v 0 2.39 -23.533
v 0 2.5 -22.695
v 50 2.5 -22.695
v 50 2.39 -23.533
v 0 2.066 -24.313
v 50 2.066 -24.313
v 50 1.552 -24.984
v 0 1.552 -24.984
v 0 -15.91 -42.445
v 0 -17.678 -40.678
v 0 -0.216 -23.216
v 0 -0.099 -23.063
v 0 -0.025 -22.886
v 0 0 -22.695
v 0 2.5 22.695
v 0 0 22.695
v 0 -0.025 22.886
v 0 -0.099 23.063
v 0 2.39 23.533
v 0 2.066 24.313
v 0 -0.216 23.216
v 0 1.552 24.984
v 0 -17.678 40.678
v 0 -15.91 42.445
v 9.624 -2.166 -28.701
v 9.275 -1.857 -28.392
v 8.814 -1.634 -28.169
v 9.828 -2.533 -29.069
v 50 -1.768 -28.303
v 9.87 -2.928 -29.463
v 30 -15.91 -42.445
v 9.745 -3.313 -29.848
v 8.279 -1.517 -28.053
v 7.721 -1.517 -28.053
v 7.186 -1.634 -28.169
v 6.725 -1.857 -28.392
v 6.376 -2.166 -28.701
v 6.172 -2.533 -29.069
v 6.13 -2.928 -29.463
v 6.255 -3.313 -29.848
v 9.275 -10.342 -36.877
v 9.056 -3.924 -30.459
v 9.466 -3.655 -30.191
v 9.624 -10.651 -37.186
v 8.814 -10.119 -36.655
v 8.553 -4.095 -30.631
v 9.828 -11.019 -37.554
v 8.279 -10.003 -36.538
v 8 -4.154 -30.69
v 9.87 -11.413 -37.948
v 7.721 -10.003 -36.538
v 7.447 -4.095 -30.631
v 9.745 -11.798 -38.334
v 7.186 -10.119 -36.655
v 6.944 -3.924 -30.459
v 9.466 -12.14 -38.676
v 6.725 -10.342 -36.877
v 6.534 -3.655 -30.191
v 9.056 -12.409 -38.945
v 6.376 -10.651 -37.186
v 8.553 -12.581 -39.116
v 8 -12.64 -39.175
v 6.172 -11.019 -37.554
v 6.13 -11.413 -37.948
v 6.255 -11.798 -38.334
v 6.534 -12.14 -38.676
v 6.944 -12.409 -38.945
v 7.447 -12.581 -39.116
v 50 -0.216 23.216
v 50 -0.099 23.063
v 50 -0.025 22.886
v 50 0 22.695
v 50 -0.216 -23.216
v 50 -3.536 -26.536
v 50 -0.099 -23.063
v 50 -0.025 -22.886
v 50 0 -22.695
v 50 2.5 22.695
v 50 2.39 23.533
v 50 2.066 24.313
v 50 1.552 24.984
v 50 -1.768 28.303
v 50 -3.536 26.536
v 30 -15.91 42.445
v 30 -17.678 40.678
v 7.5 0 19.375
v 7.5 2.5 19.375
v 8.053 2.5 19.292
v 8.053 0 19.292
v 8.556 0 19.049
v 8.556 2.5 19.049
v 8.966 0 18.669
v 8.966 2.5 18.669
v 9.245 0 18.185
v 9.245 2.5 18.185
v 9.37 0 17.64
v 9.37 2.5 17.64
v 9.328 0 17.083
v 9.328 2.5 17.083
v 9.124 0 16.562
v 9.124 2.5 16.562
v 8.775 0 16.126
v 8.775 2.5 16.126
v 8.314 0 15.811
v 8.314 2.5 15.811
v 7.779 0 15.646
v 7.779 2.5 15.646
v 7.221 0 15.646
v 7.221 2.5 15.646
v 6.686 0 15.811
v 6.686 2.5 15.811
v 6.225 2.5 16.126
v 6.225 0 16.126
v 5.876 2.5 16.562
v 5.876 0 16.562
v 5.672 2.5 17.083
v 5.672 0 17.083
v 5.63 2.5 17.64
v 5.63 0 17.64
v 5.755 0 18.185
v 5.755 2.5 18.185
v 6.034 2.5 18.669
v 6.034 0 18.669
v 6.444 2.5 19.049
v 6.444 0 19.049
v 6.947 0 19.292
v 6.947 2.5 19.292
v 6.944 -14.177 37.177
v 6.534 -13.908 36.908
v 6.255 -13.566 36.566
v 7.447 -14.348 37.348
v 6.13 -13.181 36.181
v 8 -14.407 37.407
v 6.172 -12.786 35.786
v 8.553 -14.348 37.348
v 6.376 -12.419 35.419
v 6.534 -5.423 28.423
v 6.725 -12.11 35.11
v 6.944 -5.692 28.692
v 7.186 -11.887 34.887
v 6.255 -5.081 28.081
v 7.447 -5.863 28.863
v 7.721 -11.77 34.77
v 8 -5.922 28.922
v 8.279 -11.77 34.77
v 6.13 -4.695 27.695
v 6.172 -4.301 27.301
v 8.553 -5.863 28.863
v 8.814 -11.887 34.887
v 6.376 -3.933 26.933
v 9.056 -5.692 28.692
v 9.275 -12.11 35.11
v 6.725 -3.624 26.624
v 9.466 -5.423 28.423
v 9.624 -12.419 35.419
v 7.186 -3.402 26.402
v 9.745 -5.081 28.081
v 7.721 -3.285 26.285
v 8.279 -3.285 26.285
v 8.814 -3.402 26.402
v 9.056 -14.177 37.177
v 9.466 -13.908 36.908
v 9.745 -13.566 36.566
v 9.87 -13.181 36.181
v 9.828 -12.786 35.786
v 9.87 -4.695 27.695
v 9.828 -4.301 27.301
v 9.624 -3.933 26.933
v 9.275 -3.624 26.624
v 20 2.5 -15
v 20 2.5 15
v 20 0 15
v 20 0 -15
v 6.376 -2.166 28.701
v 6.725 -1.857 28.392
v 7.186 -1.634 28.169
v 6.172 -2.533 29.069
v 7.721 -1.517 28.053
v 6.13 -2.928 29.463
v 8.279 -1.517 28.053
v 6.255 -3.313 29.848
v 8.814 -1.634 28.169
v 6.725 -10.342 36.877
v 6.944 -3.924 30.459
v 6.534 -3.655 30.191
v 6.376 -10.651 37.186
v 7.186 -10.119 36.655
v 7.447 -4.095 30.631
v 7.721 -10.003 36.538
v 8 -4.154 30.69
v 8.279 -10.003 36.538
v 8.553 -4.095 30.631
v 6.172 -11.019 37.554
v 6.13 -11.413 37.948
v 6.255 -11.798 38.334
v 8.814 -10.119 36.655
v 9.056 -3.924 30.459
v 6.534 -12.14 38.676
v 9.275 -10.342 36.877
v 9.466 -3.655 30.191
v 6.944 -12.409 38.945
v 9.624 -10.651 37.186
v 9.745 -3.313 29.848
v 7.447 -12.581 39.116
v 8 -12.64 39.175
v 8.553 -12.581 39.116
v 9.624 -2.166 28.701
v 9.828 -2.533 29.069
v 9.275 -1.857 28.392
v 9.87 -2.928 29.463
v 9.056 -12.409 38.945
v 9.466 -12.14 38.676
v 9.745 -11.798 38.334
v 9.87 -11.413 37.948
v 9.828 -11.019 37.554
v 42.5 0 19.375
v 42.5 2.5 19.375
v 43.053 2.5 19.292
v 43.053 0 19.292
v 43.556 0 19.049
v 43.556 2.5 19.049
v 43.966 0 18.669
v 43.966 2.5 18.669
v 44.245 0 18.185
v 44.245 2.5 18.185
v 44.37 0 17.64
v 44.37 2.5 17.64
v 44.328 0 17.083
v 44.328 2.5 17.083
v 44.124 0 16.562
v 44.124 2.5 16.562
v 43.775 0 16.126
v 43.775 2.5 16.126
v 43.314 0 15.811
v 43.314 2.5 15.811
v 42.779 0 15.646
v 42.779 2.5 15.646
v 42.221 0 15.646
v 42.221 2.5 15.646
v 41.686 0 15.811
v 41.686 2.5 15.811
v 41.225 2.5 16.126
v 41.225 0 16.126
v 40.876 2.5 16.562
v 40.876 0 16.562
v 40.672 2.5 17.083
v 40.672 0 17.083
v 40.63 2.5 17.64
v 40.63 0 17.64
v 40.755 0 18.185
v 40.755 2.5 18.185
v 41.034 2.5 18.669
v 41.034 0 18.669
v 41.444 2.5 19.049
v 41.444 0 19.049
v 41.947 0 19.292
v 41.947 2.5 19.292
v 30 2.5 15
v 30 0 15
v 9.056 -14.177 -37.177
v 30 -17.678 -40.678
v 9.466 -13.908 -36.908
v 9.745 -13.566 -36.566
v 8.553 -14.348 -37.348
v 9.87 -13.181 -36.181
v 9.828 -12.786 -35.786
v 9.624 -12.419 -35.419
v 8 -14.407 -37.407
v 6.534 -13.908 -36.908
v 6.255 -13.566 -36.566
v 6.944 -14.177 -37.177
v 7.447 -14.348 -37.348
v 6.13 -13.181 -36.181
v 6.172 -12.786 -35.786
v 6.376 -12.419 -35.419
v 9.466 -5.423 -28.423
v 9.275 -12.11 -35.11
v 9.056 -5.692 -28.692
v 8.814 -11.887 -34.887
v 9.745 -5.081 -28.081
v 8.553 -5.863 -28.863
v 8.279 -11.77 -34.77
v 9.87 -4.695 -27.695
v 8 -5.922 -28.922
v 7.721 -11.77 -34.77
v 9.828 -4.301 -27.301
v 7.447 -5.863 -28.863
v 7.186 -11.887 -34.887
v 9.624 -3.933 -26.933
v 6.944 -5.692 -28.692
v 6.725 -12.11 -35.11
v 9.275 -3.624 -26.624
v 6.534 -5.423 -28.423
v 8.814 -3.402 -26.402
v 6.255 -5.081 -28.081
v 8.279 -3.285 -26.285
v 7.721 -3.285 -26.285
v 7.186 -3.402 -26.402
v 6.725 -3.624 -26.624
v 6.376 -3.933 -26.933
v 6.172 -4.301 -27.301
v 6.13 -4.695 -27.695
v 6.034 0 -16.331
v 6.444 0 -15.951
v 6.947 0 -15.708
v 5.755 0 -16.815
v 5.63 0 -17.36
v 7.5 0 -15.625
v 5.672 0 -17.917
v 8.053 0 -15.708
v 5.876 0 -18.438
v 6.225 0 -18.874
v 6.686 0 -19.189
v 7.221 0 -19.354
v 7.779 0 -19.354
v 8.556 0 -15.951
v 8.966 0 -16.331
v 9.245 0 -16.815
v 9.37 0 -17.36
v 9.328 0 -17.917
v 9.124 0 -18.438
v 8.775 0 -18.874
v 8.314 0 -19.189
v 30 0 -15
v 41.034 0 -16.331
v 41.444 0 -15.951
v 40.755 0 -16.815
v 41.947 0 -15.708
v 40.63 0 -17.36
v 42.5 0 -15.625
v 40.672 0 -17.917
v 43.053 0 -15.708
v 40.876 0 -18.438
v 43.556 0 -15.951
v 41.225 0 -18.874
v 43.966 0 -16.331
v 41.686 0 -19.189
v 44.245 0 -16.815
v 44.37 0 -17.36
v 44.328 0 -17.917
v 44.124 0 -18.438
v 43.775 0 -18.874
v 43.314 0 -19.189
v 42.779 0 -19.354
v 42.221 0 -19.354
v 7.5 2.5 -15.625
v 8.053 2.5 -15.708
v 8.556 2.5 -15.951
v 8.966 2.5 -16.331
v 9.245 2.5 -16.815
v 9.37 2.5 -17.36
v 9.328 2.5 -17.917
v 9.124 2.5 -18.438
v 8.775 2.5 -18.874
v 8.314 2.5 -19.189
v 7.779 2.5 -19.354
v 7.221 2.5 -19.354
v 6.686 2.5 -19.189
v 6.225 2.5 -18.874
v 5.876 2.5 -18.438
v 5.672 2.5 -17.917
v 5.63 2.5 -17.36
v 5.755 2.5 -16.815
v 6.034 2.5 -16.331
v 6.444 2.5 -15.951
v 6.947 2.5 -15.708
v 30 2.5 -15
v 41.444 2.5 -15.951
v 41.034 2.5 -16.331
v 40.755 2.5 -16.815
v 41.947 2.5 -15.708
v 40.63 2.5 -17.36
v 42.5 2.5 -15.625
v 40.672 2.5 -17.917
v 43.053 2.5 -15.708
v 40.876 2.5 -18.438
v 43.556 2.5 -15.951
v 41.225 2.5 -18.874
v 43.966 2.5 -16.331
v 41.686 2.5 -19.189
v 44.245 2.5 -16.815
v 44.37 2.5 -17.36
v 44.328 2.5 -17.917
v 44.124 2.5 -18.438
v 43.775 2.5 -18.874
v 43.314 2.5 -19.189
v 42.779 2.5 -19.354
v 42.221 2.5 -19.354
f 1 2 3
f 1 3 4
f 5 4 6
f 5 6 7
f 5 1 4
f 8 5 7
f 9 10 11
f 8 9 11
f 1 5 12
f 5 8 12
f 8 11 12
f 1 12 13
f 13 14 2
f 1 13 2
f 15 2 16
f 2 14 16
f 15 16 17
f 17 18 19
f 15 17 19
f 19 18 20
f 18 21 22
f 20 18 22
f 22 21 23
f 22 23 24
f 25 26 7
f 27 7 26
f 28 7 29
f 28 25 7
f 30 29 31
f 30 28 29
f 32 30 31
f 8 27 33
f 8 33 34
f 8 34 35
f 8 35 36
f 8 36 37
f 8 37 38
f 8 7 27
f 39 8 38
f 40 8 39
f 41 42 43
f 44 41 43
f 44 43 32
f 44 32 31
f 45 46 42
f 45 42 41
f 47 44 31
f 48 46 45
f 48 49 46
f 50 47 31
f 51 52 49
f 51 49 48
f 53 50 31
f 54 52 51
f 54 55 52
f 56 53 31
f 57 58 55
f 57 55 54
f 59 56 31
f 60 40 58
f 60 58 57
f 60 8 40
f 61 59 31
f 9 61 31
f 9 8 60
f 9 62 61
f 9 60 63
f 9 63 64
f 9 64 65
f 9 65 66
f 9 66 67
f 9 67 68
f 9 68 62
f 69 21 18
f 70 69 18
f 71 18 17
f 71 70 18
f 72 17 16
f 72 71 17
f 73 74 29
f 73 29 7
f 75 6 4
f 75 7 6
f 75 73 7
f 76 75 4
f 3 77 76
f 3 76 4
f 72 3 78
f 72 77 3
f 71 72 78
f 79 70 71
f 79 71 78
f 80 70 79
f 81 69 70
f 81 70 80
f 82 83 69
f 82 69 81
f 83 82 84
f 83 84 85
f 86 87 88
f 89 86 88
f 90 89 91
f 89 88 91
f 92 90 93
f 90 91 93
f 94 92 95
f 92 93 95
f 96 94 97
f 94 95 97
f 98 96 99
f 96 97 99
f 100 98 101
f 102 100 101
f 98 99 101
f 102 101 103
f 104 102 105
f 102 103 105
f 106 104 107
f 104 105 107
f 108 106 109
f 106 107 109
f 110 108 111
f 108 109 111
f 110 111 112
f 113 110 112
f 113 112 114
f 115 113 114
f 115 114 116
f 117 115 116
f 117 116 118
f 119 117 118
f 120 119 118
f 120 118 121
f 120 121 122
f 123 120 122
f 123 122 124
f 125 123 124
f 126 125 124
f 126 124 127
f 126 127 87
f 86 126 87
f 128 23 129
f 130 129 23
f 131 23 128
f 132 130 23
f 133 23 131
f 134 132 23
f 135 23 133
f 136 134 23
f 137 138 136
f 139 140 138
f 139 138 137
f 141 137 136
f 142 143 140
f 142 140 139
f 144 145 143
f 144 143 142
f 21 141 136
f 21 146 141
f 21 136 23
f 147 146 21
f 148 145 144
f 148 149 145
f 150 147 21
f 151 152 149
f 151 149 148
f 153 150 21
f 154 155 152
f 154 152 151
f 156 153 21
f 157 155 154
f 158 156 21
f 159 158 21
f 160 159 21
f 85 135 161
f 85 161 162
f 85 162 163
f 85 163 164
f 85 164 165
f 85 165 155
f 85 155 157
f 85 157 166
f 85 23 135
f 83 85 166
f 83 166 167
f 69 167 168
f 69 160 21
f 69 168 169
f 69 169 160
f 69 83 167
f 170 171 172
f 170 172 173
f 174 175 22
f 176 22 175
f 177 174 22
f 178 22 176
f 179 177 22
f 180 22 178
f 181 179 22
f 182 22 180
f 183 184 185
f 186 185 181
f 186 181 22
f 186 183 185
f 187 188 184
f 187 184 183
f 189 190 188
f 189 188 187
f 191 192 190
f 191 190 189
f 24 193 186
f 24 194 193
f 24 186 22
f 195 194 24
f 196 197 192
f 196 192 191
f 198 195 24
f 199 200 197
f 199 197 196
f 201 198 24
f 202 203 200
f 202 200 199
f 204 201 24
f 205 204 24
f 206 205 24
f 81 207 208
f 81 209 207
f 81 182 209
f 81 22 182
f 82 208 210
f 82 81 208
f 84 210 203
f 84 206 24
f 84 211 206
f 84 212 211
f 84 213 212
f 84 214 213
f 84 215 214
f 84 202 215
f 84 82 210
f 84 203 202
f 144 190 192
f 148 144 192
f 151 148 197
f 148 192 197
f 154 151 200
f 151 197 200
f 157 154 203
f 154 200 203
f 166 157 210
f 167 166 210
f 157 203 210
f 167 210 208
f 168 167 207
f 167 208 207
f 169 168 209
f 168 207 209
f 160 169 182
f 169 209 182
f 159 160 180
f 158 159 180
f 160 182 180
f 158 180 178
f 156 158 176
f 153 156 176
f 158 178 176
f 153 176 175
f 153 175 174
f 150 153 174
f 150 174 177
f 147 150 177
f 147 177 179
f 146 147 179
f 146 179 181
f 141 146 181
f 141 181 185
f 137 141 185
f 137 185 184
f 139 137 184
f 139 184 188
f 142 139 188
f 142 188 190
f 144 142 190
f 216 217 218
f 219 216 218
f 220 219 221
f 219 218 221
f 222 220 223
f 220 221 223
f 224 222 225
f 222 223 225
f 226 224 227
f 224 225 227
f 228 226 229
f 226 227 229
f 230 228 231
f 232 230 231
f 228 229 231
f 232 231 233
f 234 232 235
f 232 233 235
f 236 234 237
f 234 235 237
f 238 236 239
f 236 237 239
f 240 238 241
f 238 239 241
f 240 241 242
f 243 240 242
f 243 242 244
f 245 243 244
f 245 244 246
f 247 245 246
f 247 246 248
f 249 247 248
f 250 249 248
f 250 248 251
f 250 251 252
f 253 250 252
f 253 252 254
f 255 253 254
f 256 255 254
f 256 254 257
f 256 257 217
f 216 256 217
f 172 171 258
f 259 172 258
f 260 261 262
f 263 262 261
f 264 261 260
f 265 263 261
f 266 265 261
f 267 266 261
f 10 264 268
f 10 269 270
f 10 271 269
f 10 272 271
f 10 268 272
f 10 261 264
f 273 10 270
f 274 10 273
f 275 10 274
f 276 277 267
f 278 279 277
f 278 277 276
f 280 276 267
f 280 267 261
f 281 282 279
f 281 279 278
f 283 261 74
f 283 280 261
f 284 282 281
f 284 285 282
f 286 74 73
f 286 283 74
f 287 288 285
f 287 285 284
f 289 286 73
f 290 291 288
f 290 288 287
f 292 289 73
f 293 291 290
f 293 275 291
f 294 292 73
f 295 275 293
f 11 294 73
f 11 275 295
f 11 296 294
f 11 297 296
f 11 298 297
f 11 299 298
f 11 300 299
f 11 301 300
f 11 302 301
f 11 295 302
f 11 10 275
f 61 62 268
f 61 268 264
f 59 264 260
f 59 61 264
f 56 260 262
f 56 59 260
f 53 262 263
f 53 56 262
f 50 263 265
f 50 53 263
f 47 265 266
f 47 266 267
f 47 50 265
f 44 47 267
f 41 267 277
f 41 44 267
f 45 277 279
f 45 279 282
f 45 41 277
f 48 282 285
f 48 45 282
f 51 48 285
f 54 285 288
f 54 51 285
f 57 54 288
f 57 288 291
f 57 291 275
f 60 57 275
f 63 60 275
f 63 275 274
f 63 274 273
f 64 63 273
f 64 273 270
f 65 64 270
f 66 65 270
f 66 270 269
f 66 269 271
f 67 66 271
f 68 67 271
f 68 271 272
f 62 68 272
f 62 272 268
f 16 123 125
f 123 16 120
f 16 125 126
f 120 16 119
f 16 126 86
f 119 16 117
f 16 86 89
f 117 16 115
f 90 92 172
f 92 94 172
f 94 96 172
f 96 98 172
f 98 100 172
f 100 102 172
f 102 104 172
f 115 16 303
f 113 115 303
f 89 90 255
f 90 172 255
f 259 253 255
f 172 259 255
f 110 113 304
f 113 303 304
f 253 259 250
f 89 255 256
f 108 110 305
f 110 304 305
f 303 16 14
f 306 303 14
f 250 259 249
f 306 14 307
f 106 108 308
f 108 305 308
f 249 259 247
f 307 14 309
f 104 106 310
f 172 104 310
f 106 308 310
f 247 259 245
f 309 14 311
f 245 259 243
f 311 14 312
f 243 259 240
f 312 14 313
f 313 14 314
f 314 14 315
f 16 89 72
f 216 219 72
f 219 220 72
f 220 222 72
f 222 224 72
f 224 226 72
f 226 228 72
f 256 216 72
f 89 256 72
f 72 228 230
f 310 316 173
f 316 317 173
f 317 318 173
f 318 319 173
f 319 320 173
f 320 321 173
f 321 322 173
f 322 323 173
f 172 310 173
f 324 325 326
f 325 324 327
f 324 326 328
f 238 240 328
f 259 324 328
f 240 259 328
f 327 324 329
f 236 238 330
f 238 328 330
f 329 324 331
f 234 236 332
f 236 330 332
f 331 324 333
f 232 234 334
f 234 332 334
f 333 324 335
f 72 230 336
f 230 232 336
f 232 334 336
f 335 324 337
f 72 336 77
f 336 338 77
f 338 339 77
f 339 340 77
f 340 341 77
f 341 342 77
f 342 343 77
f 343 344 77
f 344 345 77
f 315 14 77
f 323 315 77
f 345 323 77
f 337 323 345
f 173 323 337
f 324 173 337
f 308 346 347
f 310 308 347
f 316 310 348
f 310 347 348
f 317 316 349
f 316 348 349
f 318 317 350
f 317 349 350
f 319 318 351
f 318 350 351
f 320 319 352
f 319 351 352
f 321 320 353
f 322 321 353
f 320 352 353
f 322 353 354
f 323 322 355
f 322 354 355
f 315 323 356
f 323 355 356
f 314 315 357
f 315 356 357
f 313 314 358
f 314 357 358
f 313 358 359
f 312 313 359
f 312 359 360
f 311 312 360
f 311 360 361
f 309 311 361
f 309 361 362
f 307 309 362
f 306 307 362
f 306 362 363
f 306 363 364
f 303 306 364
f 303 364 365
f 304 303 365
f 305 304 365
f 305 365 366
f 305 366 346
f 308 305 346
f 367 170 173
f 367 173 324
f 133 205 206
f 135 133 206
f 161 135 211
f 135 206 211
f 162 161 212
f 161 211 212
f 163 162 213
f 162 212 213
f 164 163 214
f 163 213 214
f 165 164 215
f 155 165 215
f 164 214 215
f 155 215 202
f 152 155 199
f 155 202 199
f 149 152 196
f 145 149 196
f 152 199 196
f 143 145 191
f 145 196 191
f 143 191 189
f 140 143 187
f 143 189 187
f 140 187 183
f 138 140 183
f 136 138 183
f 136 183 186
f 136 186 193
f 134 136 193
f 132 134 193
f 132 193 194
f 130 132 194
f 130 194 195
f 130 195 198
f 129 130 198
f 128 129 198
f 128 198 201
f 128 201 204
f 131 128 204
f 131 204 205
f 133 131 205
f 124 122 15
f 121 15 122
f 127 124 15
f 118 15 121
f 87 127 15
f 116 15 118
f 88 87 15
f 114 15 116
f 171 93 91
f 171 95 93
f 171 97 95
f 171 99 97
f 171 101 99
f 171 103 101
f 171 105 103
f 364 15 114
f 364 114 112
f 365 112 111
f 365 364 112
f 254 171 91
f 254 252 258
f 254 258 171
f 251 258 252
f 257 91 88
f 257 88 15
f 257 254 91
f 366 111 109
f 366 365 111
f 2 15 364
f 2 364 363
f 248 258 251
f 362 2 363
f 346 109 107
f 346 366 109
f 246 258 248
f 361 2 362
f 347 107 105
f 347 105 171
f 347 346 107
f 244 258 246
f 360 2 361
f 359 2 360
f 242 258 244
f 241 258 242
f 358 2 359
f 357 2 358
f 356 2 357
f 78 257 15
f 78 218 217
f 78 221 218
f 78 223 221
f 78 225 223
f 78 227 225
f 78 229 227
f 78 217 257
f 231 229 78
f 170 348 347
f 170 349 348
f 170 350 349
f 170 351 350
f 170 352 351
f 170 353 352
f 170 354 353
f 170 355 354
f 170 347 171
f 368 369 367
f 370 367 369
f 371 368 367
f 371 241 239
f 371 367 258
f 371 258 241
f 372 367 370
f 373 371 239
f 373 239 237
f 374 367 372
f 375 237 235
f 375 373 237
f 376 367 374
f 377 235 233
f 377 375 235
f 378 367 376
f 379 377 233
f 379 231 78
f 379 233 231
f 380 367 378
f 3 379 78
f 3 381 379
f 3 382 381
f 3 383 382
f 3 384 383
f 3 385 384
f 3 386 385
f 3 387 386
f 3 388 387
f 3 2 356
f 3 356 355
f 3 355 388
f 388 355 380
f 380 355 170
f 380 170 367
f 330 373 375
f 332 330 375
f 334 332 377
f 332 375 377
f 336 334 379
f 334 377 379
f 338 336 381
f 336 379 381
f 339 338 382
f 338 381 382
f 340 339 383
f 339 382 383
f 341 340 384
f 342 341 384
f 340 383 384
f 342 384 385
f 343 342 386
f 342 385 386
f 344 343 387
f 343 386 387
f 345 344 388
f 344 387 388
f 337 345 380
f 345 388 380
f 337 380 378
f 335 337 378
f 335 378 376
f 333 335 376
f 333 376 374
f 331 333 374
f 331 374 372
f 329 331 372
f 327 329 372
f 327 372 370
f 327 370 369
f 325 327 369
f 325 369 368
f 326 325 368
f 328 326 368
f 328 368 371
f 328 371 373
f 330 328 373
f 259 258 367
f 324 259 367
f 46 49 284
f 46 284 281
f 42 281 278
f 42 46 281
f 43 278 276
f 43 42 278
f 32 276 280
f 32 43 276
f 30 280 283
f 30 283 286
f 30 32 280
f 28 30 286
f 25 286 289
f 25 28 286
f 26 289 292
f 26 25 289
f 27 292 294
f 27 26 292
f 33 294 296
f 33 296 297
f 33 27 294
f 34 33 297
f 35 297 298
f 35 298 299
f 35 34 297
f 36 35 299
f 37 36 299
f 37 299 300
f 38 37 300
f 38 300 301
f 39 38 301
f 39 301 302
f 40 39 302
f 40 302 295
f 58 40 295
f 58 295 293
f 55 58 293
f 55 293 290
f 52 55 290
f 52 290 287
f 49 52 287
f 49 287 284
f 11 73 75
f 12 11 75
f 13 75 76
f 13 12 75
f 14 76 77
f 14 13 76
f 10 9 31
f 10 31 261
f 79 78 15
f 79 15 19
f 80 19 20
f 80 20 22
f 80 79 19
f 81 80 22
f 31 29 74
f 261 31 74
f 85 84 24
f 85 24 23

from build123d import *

# Parameters (mm, degrees)
SKETCH1_W                      = 50
SKETCH1_H                      = 46
BASE_FLANGE1_DEPTH             = 2.5
EDGE_FLANGE1_STRIP_CUT_DEPTH   = 50
EDGE_FLANGE1_STRIP_CUT_2_DEPTH = 50
EDGE_FLANGE1_DEPTH             = 50
EDGE_FLANGE1_BEND_DEPTH        = 50
CUT_EXTRUDE1_REACH             = 83.004
SKETCH13_R                     = 1.875
CUT_EXTRUDE2_REACH             = 70.62
SKETCH14_R                     = 1.875
CHAMFER1_SIZE                  = 20
CUT_EXTRUDE3_REACH             = 70.62
SKETCH15_W                     = 10
SKETCH15_H                     = 30


# Sheet-metal steps are written as plain solids
with BuildPart() as part:
    # Sketch1 → Base-Flange1 (new body)
    with BuildSketch(Plane(origin=(0, 0, 0), x_dir=(1, 0, 0), z_dir=(0, 1, 0))):
        with Locations((25, 0)):
            Rectangle(SKETCH1_W, SKETCH1_H)
    extrude(amount=BASE_FLANGE1_DEPTH)

    # Edge-Flange1 strip (across the edge) → Edge-Flange1 strip cut (cut)
    with BuildSketch(Plane(origin=(0, 0, -23), x_dir=(0, -0.7071067811865512, 0.7071067811865438), z_dir=(1, 0, 0))):
        Polygon((-9.66479933, 6.129265424), (-1.552021808, -1.983512098), (0.215745145, -0.215745145), (-7.897032377, 7.897032377), align=None)
    extrude(amount=EDGE_FLANGE1_STRIP_CUT_DEPTH, mode=Mode.SUBTRACT)

    # Edge-Flange1 strip 2 (across the edge) → Edge-Flange1 strip cut 2 (cut)
    with BuildSketch(Plane(origin=(50, 0, 23), x_dir=(0, -0.7071067811865512, -0.7071067811865438), z_dir=(-1, 0, 0))):
        Polygon((-9.66479933, 6.129265424), (-1.552021808, -1.983512098), (0.215745145, -0.215745145), (-7.897032377, 7.897032377), align=None)
    extrude(amount=EDGE_FLANGE1_STRIP_CUT_2_DEPTH, mode=Mode.SUBTRACT)

    # Edge-Flange1 section (across the edge) → Edge-Flange1 (add)
    with BuildSketch(Plane(origin=(0, 0, -23), x_dir=(0, -0.7071067811865512, 0.7071067811865438), z_dir=(1, 0, 0))):
        with BuildLine():
            Line((-2.5, 0.30510971), (-2.5, 25))
            Line((-2.5, 25), (0, 25))
            Line((0, 25), (0, 0.30510971))
            ThreePointArc((0, 0.30510971), (0.056070336, 0.023225094), (0.215745145, -0.215745145))
            Line((0.215745145, -0.215745145), (-1.552021808, -1.983512098))
            ThreePointArc((-1.552021808, -1.983512098), (-2.253628495, -0.933483487), (-2.5, 0.30510971))
        make_face()
    extrude(amount=EDGE_FLANGE1_DEPTH)

    # Edge-Flange1 section 2 (across the edge) → Edge-Flange1 bend (add)
    with BuildSketch(Plane(origin=(50, 0, 23), x_dir=(0, -0.7071067811865512, -0.7071067811865438), z_dir=(-1, 0, 0))):
        with BuildLine():
            Line((-2.5, 0.30510971), (-2.5, 25))
            Line((-2.5, 25), (0, 25))
            Line((0, 25), (0, 0.30510971))
            ThreePointArc((0, 0.30510971), (0.056070336, 0.023225094), (0.215745145, -0.215745145))
            Line((0.215745145, -0.215745145), (-1.552021808, -1.983512098))
            ThreePointArc((-1.552021808, -1.983512098), (-2.253628495, -0.933483487), (-2.5, 0.30510971))
        make_face()
    extrude(amount=EDGE_FLANGE1_BEND_DEPTH)

    # Sketch13 → Cut-Extrude1 (cut, up to next)
    with BuildSketch(Plane(origin=(0, 13.267766953, 13.267766953), x_dir=(1, 0, 0), z_dir=(0, 0.7071067811865513, 0.7071067811865438)), mode=Mode.PRIVATE) as cut_extrude1_sk1:
        with Locations(Location((8, -22.763455967, 0), (0, 0, 270))):
            Circle(SKETCH13_R)
    cut_extrude1_tool1 = extrude(cut_extrude1_sk1.sketch, amount=-CUT_EXTRUDE1_REACH, mode=Mode.PRIVATE) & part.part
    # Sketch13 → Cut-Extrude1 (cut, up to next)
    with BuildSketch(Plane(origin=(0, 13.267766953, 13.267766953), x_dir=(1, 0, 0), z_dir=(0, 0.7071067811865513, 0.7071067811865438)), mode=Mode.PRIVATE) as cut_extrude1_sk2:
        with Locations(Location((8, -34.763455967, 0), (0, 0, 270))):
            Circle(SKETCH13_R)
    cut_extrude1_tool2 = extrude(cut_extrude1_sk2.sketch, amount=-CUT_EXTRUDE1_REACH, mode=Mode.PRIVATE) & part.part
    cut_extrude1_1 = cut_extrude1_tool1.solids().sort_by_distance((8, -2.828427, 29.363961))[0]
    add(cut_extrude1_1, mode=Mode.SUBTRACT)
    cut_extrude1_2 = cut_extrude1_tool2.solids().sort_by_distance((8, -11.313708, 37.849242))[0]
    add(cut_extrude1_2, mode=Mode.SUBTRACT)
    cut_extrude1 = cut_extrude1_1 + cut_extrude1_2  # Cut-Extrude1 as one shape, for the pattern or mirror that repeats it

    # Mirror1: Cut-Extrude1 across plane
    add(cut_extrude1.mirror(Plane.XY), mode=Mode.SUBTRACT)

    # Sketch14 → Cut-Extrude2 (cut, up to next)
    with BuildSketch(Plane(origin=(0, 2.5, 0), x_dir=(1, 0, 0), z_dir=(0, 1, 0)), mode=Mode.PRIVATE) as cut_extrude2_sk1:
        with Locations(Location((7.5, 17.5, 0), (0, 0, 270))):
            Circle(SKETCH14_R)
    cut_extrude2_tool1 = extrude(cut_extrude2_sk1.sketch, amount=-CUT_EXTRUDE2_REACH, mode=Mode.PRIVATE) & part.part
    # Sketch14 → Cut-Extrude2 (cut, up to next)
    with BuildSketch(Plane(origin=(0, 2.5, 0), x_dir=(1, 0, 0), z_dir=(0, 1, 0)), mode=Mode.PRIVATE) as cut_extrude2_sk2:
        with Locations(Location((42.5, 17.5, 0), (0, 0, 270))):
            Circle(SKETCH14_R)
    cut_extrude2_tool2 = extrude(cut_extrude2_sk2.sketch, amount=-CUT_EXTRUDE2_REACH, mode=Mode.PRIVATE) & part.part
    # Sketch14 → Cut-Extrude2 (cut, up to next)
    with BuildSketch(Plane(origin=(0, 2.5, 0), x_dir=(1, 0, 0), z_dir=(0, 1, 0)), mode=Mode.PRIVATE) as cut_extrude2_sk3:
        with Locations(Location((7.5, -17.5, 0), (0, 0, 270))):
            Circle(SKETCH14_R)
    cut_extrude2_tool3 = extrude(cut_extrude2_sk3.sketch, amount=-CUT_EXTRUDE2_REACH, mode=Mode.PRIVATE) & part.part
    # Sketch14 → Cut-Extrude2 (cut, up to next)
    with BuildSketch(Plane(origin=(0, 2.5, 0), x_dir=(1, 0, 0), z_dir=(0, 1, 0)), mode=Mode.PRIVATE) as cut_extrude2_sk4:
        with Locations(Location((42.5, -17.5, 0), (0, 0, 270))):
            Circle(SKETCH14_R)
    cut_extrude2_tool4 = extrude(cut_extrude2_sk4.sketch, amount=-CUT_EXTRUDE2_REACH, mode=Mode.PRIVATE) & part.part
    add(cut_extrude2_tool1.solids().sort_by_distance((7.5, 2.5, -17.5))[0], mode=Mode.SUBTRACT)
    add(cut_extrude2_tool2.solids().sort_by_distance((42.5, 2.5, -17.5))[0], mode=Mode.SUBTRACT)
    add(cut_extrude2_tool3.solids().sort_by_distance((7.5, 2.5, 17.5))[0], mode=Mode.SUBTRACT)
    add(cut_extrude2_tool4.solids().sort_by_distance((42.5, 2.5, 17.5))[0], mode=Mode.SUBTRACT)

    # Chamfer1
    chamfer1_edges = [part.edges().sort_by_distance(p)[0] for p in [
        (50, -16.793786053, -41.561553006),
        (50, -16.793786053, 41.561553006),
    ]]
    chamfer(chamfer1_edges, length=CHAMFER1_SIZE)

    # Sketch15 → Cut-Extrude3 (cut, up to next)
    with BuildSketch(Plane(origin=(0, 2.5, 0), x_dir=(1, 0, 0), z_dir=(0, 1, 0)), mode=Mode.PRIVATE) as cut_extrude3_sk1:
        with Locations((25, 0)):
            Rectangle(SKETCH15_W, SKETCH15_H)
    cut_extrude3_tool1 = extrude(cut_extrude3_sk1.sketch, amount=-CUT_EXTRUDE3_REACH, mode=Mode.PRIVATE) & part.part
    add(cut_extrude3_tool1.solids().sort_by_distance((25, 2.5, 0))[0], mode=Mode.SUBTRACT)


solid = part.part
